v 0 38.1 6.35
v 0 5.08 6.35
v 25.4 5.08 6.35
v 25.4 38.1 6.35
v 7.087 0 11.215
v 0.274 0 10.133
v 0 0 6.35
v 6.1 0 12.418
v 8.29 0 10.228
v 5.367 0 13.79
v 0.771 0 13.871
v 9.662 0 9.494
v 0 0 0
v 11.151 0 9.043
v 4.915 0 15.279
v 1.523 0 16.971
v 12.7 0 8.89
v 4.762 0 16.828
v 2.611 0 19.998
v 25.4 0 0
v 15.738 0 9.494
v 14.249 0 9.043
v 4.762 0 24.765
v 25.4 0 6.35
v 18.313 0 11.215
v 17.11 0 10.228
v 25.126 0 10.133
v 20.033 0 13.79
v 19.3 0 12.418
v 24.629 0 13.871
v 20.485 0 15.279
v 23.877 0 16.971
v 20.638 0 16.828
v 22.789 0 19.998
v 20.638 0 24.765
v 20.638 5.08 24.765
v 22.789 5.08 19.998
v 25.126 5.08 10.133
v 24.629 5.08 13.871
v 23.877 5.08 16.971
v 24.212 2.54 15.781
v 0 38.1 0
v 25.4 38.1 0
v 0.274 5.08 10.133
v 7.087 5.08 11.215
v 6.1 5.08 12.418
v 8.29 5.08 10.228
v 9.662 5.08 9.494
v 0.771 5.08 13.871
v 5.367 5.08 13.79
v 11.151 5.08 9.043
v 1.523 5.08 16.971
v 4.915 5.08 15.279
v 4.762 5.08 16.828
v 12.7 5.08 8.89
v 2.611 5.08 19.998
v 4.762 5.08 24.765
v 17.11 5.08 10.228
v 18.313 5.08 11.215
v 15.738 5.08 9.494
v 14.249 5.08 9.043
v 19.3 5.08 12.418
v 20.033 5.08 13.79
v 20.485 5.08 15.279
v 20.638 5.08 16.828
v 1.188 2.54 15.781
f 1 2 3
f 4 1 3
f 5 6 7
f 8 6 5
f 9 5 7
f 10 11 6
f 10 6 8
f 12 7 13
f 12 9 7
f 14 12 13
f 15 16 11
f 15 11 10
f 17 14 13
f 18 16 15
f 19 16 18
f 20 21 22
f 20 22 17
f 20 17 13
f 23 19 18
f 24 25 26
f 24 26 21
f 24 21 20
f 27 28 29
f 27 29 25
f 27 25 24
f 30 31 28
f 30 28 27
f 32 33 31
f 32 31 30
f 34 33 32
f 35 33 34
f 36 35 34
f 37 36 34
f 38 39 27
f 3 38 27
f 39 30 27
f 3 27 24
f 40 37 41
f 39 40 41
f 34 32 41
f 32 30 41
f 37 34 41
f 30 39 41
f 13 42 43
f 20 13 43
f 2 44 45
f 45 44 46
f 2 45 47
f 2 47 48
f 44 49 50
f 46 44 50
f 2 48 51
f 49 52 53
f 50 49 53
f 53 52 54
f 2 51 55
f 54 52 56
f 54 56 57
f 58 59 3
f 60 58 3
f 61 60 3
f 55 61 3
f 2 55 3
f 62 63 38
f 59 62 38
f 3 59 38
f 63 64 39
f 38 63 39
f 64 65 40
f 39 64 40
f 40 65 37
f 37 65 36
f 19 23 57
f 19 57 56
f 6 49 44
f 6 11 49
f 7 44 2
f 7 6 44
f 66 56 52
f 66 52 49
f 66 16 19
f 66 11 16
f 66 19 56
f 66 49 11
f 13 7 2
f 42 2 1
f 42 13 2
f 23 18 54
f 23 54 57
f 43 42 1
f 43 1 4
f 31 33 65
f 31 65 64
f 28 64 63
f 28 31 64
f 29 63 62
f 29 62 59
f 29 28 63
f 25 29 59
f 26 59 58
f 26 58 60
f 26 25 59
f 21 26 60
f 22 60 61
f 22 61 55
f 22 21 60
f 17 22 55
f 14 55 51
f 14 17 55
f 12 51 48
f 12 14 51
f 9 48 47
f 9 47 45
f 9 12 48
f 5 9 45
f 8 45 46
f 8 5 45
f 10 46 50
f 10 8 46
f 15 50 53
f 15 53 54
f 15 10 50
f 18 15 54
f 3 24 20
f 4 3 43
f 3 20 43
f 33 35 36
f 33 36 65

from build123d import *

# Parameters (mm, degrees)
F0_W     = 25.4
F0_H     = 38.1
F1_DEPTH = 6.35
F3_DEPTH = 5.08


with BuildPart() as f1:
    # F0 (on Top) → F1 (new body)
    with BuildSketch(Plane.XY):
        with Locations((12.7, 19.05)):
            Rectangle(F0_W, F0_H)
    extrude(amount=F1_DEPTH)

    # F2 (on face) → F3 (join)
    with BuildSketch(Plane.XZ):
        with BuildLine():
            Line((20.6375, 24.765), (20.6375, 16.8275))
            ThreePointArc((20.6375, 16.8275), (12.7, 8.89), (4.7625, 16.8275))
            Line((4.7625, 16.8275), (4.7625, 24.765))
            add(Edge.make_bspline(
                [(4.7625, 24.765), (3.3686927535, 21.8445697007), (0.6056416057, 15.9246700816), (0.1980293046, 9.5340720789), (0, 6.35)],
                knots=[0, 0, 0, 0, 0.5021426244, 1, 1, 1, 1], degree=3))
            Line((0, 6.35), (25.4, 6.35))
            add(Edge.make_bspline(
                [(20.6375, 24.765), (22.0313072465, 21.8445697007), (24.7943583943, 15.9246700816), (25.2019706954, 9.5340720789), (25.4, 6.35)],
                knots=[0, 0, 0, 0, 0.5021426244, 1, 1, 1, 1], degree=3))
        make_face()
    extrude(amount=-F3_DEPTH)


solid = f1.part
